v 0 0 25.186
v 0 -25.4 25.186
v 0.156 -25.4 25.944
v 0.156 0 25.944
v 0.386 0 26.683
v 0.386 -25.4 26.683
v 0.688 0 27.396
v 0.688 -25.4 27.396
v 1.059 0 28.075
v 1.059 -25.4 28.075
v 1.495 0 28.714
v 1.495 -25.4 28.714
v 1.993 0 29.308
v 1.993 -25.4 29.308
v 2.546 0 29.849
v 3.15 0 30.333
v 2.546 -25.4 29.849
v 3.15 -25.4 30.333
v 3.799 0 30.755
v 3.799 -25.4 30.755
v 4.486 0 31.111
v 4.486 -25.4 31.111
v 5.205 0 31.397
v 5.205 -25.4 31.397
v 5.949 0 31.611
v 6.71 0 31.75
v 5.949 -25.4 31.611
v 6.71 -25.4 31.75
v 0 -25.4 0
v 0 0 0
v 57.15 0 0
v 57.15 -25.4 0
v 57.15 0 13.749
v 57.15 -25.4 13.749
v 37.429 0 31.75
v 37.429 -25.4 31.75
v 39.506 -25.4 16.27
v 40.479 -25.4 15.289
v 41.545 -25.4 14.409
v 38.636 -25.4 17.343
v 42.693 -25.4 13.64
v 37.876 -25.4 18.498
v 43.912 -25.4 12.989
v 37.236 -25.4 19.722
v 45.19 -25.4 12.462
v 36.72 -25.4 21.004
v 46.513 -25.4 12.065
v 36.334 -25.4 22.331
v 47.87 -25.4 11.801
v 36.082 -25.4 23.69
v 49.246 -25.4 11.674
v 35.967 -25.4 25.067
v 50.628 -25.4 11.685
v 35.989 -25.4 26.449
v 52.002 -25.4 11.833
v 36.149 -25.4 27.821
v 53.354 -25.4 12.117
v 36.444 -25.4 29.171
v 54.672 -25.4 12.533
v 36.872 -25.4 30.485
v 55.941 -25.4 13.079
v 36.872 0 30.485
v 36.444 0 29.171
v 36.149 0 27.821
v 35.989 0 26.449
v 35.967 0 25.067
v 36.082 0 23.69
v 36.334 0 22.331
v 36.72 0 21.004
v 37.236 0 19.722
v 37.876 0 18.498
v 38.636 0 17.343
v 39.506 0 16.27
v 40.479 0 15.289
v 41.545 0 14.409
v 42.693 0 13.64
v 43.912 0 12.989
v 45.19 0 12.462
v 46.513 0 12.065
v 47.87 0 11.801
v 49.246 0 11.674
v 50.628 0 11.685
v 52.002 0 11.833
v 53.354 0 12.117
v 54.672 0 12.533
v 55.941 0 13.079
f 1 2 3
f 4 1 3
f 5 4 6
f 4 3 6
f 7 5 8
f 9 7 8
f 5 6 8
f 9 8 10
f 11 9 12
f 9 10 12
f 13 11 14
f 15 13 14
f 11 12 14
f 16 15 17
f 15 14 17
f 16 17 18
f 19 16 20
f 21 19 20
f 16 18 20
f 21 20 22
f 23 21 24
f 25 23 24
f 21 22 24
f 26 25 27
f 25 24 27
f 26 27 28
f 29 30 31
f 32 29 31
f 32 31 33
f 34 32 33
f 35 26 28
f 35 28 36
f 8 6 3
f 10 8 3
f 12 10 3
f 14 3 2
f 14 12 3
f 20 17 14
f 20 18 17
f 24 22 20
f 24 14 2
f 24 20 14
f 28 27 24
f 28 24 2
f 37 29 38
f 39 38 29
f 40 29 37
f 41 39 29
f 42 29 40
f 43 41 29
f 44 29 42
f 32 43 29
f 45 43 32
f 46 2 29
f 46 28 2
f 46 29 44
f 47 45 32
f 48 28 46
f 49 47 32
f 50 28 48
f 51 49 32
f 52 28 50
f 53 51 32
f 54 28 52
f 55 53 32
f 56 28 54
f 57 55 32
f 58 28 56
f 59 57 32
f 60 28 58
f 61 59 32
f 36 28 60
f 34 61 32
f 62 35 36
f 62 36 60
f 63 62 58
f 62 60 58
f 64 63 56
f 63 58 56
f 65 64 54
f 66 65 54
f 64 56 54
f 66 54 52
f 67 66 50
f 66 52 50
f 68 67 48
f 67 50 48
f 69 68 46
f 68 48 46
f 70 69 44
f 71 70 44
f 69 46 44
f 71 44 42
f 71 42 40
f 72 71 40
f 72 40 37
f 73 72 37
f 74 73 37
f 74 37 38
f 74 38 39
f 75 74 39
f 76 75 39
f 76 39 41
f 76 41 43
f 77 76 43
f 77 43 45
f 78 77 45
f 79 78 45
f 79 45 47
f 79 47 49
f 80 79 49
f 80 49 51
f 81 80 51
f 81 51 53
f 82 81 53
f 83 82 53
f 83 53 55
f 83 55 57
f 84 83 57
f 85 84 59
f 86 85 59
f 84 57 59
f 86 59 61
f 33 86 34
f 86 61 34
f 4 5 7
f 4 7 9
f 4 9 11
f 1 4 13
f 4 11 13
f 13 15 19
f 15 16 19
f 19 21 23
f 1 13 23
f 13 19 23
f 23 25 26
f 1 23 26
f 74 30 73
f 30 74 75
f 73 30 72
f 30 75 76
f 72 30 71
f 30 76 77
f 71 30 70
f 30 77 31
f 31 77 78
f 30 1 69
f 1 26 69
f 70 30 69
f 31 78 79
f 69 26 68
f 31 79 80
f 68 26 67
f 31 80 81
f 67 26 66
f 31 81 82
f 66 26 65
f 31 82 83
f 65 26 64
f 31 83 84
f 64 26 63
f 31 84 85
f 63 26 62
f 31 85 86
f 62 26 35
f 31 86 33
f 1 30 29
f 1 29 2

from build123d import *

# Parameters (mm, degrees)
F0_W     = 57.15
F0_H     = 31.75
F1_DEPTH = 25.4
F3_DEPTH = 25.4
F5_R     = 13.8731046092
F6_DEPTH = 25.4


# Not quite as in the source:
# - a feature names something its author has since deleted; it is built from what else it names


with BuildPart() as f1:
    # F0 (on Front) → F1 (new body)
    with BuildSketch(Plane.XZ):
        with Locations((28.575, 15.875)):
            Rectangle(F0_W, F0_H)
    extrude(amount=F1_DEPTH)

    # F2 (on face) → F3 (cut)
    with BuildSketch(Plane.XZ.offset(25.4)):
        with BuildLine():
            ThreePointArc((0, 25.186264758), (2.2625309899, 29.5850653675), (6.7101765828, 31.75))
            Line((6.7101765828, 31.75), (0, 31.75))
            Line((0, 31.75), (0, 25.186264758))
        make_face()
    extrude(amount=-F3_DEPTH, mode=Mode.SUBTRACT)

    # F5 (on face) → F6 (cut)
    with BuildSketch(Plane.XZ.offset(25.4)):
        with Locations((49.8321466148, 25.5351066589)):
            Circle(F5_R)
    extrude(amount=-F6_DEPTH, mode=Mode.SUBTRACT)


solid = f1.part
